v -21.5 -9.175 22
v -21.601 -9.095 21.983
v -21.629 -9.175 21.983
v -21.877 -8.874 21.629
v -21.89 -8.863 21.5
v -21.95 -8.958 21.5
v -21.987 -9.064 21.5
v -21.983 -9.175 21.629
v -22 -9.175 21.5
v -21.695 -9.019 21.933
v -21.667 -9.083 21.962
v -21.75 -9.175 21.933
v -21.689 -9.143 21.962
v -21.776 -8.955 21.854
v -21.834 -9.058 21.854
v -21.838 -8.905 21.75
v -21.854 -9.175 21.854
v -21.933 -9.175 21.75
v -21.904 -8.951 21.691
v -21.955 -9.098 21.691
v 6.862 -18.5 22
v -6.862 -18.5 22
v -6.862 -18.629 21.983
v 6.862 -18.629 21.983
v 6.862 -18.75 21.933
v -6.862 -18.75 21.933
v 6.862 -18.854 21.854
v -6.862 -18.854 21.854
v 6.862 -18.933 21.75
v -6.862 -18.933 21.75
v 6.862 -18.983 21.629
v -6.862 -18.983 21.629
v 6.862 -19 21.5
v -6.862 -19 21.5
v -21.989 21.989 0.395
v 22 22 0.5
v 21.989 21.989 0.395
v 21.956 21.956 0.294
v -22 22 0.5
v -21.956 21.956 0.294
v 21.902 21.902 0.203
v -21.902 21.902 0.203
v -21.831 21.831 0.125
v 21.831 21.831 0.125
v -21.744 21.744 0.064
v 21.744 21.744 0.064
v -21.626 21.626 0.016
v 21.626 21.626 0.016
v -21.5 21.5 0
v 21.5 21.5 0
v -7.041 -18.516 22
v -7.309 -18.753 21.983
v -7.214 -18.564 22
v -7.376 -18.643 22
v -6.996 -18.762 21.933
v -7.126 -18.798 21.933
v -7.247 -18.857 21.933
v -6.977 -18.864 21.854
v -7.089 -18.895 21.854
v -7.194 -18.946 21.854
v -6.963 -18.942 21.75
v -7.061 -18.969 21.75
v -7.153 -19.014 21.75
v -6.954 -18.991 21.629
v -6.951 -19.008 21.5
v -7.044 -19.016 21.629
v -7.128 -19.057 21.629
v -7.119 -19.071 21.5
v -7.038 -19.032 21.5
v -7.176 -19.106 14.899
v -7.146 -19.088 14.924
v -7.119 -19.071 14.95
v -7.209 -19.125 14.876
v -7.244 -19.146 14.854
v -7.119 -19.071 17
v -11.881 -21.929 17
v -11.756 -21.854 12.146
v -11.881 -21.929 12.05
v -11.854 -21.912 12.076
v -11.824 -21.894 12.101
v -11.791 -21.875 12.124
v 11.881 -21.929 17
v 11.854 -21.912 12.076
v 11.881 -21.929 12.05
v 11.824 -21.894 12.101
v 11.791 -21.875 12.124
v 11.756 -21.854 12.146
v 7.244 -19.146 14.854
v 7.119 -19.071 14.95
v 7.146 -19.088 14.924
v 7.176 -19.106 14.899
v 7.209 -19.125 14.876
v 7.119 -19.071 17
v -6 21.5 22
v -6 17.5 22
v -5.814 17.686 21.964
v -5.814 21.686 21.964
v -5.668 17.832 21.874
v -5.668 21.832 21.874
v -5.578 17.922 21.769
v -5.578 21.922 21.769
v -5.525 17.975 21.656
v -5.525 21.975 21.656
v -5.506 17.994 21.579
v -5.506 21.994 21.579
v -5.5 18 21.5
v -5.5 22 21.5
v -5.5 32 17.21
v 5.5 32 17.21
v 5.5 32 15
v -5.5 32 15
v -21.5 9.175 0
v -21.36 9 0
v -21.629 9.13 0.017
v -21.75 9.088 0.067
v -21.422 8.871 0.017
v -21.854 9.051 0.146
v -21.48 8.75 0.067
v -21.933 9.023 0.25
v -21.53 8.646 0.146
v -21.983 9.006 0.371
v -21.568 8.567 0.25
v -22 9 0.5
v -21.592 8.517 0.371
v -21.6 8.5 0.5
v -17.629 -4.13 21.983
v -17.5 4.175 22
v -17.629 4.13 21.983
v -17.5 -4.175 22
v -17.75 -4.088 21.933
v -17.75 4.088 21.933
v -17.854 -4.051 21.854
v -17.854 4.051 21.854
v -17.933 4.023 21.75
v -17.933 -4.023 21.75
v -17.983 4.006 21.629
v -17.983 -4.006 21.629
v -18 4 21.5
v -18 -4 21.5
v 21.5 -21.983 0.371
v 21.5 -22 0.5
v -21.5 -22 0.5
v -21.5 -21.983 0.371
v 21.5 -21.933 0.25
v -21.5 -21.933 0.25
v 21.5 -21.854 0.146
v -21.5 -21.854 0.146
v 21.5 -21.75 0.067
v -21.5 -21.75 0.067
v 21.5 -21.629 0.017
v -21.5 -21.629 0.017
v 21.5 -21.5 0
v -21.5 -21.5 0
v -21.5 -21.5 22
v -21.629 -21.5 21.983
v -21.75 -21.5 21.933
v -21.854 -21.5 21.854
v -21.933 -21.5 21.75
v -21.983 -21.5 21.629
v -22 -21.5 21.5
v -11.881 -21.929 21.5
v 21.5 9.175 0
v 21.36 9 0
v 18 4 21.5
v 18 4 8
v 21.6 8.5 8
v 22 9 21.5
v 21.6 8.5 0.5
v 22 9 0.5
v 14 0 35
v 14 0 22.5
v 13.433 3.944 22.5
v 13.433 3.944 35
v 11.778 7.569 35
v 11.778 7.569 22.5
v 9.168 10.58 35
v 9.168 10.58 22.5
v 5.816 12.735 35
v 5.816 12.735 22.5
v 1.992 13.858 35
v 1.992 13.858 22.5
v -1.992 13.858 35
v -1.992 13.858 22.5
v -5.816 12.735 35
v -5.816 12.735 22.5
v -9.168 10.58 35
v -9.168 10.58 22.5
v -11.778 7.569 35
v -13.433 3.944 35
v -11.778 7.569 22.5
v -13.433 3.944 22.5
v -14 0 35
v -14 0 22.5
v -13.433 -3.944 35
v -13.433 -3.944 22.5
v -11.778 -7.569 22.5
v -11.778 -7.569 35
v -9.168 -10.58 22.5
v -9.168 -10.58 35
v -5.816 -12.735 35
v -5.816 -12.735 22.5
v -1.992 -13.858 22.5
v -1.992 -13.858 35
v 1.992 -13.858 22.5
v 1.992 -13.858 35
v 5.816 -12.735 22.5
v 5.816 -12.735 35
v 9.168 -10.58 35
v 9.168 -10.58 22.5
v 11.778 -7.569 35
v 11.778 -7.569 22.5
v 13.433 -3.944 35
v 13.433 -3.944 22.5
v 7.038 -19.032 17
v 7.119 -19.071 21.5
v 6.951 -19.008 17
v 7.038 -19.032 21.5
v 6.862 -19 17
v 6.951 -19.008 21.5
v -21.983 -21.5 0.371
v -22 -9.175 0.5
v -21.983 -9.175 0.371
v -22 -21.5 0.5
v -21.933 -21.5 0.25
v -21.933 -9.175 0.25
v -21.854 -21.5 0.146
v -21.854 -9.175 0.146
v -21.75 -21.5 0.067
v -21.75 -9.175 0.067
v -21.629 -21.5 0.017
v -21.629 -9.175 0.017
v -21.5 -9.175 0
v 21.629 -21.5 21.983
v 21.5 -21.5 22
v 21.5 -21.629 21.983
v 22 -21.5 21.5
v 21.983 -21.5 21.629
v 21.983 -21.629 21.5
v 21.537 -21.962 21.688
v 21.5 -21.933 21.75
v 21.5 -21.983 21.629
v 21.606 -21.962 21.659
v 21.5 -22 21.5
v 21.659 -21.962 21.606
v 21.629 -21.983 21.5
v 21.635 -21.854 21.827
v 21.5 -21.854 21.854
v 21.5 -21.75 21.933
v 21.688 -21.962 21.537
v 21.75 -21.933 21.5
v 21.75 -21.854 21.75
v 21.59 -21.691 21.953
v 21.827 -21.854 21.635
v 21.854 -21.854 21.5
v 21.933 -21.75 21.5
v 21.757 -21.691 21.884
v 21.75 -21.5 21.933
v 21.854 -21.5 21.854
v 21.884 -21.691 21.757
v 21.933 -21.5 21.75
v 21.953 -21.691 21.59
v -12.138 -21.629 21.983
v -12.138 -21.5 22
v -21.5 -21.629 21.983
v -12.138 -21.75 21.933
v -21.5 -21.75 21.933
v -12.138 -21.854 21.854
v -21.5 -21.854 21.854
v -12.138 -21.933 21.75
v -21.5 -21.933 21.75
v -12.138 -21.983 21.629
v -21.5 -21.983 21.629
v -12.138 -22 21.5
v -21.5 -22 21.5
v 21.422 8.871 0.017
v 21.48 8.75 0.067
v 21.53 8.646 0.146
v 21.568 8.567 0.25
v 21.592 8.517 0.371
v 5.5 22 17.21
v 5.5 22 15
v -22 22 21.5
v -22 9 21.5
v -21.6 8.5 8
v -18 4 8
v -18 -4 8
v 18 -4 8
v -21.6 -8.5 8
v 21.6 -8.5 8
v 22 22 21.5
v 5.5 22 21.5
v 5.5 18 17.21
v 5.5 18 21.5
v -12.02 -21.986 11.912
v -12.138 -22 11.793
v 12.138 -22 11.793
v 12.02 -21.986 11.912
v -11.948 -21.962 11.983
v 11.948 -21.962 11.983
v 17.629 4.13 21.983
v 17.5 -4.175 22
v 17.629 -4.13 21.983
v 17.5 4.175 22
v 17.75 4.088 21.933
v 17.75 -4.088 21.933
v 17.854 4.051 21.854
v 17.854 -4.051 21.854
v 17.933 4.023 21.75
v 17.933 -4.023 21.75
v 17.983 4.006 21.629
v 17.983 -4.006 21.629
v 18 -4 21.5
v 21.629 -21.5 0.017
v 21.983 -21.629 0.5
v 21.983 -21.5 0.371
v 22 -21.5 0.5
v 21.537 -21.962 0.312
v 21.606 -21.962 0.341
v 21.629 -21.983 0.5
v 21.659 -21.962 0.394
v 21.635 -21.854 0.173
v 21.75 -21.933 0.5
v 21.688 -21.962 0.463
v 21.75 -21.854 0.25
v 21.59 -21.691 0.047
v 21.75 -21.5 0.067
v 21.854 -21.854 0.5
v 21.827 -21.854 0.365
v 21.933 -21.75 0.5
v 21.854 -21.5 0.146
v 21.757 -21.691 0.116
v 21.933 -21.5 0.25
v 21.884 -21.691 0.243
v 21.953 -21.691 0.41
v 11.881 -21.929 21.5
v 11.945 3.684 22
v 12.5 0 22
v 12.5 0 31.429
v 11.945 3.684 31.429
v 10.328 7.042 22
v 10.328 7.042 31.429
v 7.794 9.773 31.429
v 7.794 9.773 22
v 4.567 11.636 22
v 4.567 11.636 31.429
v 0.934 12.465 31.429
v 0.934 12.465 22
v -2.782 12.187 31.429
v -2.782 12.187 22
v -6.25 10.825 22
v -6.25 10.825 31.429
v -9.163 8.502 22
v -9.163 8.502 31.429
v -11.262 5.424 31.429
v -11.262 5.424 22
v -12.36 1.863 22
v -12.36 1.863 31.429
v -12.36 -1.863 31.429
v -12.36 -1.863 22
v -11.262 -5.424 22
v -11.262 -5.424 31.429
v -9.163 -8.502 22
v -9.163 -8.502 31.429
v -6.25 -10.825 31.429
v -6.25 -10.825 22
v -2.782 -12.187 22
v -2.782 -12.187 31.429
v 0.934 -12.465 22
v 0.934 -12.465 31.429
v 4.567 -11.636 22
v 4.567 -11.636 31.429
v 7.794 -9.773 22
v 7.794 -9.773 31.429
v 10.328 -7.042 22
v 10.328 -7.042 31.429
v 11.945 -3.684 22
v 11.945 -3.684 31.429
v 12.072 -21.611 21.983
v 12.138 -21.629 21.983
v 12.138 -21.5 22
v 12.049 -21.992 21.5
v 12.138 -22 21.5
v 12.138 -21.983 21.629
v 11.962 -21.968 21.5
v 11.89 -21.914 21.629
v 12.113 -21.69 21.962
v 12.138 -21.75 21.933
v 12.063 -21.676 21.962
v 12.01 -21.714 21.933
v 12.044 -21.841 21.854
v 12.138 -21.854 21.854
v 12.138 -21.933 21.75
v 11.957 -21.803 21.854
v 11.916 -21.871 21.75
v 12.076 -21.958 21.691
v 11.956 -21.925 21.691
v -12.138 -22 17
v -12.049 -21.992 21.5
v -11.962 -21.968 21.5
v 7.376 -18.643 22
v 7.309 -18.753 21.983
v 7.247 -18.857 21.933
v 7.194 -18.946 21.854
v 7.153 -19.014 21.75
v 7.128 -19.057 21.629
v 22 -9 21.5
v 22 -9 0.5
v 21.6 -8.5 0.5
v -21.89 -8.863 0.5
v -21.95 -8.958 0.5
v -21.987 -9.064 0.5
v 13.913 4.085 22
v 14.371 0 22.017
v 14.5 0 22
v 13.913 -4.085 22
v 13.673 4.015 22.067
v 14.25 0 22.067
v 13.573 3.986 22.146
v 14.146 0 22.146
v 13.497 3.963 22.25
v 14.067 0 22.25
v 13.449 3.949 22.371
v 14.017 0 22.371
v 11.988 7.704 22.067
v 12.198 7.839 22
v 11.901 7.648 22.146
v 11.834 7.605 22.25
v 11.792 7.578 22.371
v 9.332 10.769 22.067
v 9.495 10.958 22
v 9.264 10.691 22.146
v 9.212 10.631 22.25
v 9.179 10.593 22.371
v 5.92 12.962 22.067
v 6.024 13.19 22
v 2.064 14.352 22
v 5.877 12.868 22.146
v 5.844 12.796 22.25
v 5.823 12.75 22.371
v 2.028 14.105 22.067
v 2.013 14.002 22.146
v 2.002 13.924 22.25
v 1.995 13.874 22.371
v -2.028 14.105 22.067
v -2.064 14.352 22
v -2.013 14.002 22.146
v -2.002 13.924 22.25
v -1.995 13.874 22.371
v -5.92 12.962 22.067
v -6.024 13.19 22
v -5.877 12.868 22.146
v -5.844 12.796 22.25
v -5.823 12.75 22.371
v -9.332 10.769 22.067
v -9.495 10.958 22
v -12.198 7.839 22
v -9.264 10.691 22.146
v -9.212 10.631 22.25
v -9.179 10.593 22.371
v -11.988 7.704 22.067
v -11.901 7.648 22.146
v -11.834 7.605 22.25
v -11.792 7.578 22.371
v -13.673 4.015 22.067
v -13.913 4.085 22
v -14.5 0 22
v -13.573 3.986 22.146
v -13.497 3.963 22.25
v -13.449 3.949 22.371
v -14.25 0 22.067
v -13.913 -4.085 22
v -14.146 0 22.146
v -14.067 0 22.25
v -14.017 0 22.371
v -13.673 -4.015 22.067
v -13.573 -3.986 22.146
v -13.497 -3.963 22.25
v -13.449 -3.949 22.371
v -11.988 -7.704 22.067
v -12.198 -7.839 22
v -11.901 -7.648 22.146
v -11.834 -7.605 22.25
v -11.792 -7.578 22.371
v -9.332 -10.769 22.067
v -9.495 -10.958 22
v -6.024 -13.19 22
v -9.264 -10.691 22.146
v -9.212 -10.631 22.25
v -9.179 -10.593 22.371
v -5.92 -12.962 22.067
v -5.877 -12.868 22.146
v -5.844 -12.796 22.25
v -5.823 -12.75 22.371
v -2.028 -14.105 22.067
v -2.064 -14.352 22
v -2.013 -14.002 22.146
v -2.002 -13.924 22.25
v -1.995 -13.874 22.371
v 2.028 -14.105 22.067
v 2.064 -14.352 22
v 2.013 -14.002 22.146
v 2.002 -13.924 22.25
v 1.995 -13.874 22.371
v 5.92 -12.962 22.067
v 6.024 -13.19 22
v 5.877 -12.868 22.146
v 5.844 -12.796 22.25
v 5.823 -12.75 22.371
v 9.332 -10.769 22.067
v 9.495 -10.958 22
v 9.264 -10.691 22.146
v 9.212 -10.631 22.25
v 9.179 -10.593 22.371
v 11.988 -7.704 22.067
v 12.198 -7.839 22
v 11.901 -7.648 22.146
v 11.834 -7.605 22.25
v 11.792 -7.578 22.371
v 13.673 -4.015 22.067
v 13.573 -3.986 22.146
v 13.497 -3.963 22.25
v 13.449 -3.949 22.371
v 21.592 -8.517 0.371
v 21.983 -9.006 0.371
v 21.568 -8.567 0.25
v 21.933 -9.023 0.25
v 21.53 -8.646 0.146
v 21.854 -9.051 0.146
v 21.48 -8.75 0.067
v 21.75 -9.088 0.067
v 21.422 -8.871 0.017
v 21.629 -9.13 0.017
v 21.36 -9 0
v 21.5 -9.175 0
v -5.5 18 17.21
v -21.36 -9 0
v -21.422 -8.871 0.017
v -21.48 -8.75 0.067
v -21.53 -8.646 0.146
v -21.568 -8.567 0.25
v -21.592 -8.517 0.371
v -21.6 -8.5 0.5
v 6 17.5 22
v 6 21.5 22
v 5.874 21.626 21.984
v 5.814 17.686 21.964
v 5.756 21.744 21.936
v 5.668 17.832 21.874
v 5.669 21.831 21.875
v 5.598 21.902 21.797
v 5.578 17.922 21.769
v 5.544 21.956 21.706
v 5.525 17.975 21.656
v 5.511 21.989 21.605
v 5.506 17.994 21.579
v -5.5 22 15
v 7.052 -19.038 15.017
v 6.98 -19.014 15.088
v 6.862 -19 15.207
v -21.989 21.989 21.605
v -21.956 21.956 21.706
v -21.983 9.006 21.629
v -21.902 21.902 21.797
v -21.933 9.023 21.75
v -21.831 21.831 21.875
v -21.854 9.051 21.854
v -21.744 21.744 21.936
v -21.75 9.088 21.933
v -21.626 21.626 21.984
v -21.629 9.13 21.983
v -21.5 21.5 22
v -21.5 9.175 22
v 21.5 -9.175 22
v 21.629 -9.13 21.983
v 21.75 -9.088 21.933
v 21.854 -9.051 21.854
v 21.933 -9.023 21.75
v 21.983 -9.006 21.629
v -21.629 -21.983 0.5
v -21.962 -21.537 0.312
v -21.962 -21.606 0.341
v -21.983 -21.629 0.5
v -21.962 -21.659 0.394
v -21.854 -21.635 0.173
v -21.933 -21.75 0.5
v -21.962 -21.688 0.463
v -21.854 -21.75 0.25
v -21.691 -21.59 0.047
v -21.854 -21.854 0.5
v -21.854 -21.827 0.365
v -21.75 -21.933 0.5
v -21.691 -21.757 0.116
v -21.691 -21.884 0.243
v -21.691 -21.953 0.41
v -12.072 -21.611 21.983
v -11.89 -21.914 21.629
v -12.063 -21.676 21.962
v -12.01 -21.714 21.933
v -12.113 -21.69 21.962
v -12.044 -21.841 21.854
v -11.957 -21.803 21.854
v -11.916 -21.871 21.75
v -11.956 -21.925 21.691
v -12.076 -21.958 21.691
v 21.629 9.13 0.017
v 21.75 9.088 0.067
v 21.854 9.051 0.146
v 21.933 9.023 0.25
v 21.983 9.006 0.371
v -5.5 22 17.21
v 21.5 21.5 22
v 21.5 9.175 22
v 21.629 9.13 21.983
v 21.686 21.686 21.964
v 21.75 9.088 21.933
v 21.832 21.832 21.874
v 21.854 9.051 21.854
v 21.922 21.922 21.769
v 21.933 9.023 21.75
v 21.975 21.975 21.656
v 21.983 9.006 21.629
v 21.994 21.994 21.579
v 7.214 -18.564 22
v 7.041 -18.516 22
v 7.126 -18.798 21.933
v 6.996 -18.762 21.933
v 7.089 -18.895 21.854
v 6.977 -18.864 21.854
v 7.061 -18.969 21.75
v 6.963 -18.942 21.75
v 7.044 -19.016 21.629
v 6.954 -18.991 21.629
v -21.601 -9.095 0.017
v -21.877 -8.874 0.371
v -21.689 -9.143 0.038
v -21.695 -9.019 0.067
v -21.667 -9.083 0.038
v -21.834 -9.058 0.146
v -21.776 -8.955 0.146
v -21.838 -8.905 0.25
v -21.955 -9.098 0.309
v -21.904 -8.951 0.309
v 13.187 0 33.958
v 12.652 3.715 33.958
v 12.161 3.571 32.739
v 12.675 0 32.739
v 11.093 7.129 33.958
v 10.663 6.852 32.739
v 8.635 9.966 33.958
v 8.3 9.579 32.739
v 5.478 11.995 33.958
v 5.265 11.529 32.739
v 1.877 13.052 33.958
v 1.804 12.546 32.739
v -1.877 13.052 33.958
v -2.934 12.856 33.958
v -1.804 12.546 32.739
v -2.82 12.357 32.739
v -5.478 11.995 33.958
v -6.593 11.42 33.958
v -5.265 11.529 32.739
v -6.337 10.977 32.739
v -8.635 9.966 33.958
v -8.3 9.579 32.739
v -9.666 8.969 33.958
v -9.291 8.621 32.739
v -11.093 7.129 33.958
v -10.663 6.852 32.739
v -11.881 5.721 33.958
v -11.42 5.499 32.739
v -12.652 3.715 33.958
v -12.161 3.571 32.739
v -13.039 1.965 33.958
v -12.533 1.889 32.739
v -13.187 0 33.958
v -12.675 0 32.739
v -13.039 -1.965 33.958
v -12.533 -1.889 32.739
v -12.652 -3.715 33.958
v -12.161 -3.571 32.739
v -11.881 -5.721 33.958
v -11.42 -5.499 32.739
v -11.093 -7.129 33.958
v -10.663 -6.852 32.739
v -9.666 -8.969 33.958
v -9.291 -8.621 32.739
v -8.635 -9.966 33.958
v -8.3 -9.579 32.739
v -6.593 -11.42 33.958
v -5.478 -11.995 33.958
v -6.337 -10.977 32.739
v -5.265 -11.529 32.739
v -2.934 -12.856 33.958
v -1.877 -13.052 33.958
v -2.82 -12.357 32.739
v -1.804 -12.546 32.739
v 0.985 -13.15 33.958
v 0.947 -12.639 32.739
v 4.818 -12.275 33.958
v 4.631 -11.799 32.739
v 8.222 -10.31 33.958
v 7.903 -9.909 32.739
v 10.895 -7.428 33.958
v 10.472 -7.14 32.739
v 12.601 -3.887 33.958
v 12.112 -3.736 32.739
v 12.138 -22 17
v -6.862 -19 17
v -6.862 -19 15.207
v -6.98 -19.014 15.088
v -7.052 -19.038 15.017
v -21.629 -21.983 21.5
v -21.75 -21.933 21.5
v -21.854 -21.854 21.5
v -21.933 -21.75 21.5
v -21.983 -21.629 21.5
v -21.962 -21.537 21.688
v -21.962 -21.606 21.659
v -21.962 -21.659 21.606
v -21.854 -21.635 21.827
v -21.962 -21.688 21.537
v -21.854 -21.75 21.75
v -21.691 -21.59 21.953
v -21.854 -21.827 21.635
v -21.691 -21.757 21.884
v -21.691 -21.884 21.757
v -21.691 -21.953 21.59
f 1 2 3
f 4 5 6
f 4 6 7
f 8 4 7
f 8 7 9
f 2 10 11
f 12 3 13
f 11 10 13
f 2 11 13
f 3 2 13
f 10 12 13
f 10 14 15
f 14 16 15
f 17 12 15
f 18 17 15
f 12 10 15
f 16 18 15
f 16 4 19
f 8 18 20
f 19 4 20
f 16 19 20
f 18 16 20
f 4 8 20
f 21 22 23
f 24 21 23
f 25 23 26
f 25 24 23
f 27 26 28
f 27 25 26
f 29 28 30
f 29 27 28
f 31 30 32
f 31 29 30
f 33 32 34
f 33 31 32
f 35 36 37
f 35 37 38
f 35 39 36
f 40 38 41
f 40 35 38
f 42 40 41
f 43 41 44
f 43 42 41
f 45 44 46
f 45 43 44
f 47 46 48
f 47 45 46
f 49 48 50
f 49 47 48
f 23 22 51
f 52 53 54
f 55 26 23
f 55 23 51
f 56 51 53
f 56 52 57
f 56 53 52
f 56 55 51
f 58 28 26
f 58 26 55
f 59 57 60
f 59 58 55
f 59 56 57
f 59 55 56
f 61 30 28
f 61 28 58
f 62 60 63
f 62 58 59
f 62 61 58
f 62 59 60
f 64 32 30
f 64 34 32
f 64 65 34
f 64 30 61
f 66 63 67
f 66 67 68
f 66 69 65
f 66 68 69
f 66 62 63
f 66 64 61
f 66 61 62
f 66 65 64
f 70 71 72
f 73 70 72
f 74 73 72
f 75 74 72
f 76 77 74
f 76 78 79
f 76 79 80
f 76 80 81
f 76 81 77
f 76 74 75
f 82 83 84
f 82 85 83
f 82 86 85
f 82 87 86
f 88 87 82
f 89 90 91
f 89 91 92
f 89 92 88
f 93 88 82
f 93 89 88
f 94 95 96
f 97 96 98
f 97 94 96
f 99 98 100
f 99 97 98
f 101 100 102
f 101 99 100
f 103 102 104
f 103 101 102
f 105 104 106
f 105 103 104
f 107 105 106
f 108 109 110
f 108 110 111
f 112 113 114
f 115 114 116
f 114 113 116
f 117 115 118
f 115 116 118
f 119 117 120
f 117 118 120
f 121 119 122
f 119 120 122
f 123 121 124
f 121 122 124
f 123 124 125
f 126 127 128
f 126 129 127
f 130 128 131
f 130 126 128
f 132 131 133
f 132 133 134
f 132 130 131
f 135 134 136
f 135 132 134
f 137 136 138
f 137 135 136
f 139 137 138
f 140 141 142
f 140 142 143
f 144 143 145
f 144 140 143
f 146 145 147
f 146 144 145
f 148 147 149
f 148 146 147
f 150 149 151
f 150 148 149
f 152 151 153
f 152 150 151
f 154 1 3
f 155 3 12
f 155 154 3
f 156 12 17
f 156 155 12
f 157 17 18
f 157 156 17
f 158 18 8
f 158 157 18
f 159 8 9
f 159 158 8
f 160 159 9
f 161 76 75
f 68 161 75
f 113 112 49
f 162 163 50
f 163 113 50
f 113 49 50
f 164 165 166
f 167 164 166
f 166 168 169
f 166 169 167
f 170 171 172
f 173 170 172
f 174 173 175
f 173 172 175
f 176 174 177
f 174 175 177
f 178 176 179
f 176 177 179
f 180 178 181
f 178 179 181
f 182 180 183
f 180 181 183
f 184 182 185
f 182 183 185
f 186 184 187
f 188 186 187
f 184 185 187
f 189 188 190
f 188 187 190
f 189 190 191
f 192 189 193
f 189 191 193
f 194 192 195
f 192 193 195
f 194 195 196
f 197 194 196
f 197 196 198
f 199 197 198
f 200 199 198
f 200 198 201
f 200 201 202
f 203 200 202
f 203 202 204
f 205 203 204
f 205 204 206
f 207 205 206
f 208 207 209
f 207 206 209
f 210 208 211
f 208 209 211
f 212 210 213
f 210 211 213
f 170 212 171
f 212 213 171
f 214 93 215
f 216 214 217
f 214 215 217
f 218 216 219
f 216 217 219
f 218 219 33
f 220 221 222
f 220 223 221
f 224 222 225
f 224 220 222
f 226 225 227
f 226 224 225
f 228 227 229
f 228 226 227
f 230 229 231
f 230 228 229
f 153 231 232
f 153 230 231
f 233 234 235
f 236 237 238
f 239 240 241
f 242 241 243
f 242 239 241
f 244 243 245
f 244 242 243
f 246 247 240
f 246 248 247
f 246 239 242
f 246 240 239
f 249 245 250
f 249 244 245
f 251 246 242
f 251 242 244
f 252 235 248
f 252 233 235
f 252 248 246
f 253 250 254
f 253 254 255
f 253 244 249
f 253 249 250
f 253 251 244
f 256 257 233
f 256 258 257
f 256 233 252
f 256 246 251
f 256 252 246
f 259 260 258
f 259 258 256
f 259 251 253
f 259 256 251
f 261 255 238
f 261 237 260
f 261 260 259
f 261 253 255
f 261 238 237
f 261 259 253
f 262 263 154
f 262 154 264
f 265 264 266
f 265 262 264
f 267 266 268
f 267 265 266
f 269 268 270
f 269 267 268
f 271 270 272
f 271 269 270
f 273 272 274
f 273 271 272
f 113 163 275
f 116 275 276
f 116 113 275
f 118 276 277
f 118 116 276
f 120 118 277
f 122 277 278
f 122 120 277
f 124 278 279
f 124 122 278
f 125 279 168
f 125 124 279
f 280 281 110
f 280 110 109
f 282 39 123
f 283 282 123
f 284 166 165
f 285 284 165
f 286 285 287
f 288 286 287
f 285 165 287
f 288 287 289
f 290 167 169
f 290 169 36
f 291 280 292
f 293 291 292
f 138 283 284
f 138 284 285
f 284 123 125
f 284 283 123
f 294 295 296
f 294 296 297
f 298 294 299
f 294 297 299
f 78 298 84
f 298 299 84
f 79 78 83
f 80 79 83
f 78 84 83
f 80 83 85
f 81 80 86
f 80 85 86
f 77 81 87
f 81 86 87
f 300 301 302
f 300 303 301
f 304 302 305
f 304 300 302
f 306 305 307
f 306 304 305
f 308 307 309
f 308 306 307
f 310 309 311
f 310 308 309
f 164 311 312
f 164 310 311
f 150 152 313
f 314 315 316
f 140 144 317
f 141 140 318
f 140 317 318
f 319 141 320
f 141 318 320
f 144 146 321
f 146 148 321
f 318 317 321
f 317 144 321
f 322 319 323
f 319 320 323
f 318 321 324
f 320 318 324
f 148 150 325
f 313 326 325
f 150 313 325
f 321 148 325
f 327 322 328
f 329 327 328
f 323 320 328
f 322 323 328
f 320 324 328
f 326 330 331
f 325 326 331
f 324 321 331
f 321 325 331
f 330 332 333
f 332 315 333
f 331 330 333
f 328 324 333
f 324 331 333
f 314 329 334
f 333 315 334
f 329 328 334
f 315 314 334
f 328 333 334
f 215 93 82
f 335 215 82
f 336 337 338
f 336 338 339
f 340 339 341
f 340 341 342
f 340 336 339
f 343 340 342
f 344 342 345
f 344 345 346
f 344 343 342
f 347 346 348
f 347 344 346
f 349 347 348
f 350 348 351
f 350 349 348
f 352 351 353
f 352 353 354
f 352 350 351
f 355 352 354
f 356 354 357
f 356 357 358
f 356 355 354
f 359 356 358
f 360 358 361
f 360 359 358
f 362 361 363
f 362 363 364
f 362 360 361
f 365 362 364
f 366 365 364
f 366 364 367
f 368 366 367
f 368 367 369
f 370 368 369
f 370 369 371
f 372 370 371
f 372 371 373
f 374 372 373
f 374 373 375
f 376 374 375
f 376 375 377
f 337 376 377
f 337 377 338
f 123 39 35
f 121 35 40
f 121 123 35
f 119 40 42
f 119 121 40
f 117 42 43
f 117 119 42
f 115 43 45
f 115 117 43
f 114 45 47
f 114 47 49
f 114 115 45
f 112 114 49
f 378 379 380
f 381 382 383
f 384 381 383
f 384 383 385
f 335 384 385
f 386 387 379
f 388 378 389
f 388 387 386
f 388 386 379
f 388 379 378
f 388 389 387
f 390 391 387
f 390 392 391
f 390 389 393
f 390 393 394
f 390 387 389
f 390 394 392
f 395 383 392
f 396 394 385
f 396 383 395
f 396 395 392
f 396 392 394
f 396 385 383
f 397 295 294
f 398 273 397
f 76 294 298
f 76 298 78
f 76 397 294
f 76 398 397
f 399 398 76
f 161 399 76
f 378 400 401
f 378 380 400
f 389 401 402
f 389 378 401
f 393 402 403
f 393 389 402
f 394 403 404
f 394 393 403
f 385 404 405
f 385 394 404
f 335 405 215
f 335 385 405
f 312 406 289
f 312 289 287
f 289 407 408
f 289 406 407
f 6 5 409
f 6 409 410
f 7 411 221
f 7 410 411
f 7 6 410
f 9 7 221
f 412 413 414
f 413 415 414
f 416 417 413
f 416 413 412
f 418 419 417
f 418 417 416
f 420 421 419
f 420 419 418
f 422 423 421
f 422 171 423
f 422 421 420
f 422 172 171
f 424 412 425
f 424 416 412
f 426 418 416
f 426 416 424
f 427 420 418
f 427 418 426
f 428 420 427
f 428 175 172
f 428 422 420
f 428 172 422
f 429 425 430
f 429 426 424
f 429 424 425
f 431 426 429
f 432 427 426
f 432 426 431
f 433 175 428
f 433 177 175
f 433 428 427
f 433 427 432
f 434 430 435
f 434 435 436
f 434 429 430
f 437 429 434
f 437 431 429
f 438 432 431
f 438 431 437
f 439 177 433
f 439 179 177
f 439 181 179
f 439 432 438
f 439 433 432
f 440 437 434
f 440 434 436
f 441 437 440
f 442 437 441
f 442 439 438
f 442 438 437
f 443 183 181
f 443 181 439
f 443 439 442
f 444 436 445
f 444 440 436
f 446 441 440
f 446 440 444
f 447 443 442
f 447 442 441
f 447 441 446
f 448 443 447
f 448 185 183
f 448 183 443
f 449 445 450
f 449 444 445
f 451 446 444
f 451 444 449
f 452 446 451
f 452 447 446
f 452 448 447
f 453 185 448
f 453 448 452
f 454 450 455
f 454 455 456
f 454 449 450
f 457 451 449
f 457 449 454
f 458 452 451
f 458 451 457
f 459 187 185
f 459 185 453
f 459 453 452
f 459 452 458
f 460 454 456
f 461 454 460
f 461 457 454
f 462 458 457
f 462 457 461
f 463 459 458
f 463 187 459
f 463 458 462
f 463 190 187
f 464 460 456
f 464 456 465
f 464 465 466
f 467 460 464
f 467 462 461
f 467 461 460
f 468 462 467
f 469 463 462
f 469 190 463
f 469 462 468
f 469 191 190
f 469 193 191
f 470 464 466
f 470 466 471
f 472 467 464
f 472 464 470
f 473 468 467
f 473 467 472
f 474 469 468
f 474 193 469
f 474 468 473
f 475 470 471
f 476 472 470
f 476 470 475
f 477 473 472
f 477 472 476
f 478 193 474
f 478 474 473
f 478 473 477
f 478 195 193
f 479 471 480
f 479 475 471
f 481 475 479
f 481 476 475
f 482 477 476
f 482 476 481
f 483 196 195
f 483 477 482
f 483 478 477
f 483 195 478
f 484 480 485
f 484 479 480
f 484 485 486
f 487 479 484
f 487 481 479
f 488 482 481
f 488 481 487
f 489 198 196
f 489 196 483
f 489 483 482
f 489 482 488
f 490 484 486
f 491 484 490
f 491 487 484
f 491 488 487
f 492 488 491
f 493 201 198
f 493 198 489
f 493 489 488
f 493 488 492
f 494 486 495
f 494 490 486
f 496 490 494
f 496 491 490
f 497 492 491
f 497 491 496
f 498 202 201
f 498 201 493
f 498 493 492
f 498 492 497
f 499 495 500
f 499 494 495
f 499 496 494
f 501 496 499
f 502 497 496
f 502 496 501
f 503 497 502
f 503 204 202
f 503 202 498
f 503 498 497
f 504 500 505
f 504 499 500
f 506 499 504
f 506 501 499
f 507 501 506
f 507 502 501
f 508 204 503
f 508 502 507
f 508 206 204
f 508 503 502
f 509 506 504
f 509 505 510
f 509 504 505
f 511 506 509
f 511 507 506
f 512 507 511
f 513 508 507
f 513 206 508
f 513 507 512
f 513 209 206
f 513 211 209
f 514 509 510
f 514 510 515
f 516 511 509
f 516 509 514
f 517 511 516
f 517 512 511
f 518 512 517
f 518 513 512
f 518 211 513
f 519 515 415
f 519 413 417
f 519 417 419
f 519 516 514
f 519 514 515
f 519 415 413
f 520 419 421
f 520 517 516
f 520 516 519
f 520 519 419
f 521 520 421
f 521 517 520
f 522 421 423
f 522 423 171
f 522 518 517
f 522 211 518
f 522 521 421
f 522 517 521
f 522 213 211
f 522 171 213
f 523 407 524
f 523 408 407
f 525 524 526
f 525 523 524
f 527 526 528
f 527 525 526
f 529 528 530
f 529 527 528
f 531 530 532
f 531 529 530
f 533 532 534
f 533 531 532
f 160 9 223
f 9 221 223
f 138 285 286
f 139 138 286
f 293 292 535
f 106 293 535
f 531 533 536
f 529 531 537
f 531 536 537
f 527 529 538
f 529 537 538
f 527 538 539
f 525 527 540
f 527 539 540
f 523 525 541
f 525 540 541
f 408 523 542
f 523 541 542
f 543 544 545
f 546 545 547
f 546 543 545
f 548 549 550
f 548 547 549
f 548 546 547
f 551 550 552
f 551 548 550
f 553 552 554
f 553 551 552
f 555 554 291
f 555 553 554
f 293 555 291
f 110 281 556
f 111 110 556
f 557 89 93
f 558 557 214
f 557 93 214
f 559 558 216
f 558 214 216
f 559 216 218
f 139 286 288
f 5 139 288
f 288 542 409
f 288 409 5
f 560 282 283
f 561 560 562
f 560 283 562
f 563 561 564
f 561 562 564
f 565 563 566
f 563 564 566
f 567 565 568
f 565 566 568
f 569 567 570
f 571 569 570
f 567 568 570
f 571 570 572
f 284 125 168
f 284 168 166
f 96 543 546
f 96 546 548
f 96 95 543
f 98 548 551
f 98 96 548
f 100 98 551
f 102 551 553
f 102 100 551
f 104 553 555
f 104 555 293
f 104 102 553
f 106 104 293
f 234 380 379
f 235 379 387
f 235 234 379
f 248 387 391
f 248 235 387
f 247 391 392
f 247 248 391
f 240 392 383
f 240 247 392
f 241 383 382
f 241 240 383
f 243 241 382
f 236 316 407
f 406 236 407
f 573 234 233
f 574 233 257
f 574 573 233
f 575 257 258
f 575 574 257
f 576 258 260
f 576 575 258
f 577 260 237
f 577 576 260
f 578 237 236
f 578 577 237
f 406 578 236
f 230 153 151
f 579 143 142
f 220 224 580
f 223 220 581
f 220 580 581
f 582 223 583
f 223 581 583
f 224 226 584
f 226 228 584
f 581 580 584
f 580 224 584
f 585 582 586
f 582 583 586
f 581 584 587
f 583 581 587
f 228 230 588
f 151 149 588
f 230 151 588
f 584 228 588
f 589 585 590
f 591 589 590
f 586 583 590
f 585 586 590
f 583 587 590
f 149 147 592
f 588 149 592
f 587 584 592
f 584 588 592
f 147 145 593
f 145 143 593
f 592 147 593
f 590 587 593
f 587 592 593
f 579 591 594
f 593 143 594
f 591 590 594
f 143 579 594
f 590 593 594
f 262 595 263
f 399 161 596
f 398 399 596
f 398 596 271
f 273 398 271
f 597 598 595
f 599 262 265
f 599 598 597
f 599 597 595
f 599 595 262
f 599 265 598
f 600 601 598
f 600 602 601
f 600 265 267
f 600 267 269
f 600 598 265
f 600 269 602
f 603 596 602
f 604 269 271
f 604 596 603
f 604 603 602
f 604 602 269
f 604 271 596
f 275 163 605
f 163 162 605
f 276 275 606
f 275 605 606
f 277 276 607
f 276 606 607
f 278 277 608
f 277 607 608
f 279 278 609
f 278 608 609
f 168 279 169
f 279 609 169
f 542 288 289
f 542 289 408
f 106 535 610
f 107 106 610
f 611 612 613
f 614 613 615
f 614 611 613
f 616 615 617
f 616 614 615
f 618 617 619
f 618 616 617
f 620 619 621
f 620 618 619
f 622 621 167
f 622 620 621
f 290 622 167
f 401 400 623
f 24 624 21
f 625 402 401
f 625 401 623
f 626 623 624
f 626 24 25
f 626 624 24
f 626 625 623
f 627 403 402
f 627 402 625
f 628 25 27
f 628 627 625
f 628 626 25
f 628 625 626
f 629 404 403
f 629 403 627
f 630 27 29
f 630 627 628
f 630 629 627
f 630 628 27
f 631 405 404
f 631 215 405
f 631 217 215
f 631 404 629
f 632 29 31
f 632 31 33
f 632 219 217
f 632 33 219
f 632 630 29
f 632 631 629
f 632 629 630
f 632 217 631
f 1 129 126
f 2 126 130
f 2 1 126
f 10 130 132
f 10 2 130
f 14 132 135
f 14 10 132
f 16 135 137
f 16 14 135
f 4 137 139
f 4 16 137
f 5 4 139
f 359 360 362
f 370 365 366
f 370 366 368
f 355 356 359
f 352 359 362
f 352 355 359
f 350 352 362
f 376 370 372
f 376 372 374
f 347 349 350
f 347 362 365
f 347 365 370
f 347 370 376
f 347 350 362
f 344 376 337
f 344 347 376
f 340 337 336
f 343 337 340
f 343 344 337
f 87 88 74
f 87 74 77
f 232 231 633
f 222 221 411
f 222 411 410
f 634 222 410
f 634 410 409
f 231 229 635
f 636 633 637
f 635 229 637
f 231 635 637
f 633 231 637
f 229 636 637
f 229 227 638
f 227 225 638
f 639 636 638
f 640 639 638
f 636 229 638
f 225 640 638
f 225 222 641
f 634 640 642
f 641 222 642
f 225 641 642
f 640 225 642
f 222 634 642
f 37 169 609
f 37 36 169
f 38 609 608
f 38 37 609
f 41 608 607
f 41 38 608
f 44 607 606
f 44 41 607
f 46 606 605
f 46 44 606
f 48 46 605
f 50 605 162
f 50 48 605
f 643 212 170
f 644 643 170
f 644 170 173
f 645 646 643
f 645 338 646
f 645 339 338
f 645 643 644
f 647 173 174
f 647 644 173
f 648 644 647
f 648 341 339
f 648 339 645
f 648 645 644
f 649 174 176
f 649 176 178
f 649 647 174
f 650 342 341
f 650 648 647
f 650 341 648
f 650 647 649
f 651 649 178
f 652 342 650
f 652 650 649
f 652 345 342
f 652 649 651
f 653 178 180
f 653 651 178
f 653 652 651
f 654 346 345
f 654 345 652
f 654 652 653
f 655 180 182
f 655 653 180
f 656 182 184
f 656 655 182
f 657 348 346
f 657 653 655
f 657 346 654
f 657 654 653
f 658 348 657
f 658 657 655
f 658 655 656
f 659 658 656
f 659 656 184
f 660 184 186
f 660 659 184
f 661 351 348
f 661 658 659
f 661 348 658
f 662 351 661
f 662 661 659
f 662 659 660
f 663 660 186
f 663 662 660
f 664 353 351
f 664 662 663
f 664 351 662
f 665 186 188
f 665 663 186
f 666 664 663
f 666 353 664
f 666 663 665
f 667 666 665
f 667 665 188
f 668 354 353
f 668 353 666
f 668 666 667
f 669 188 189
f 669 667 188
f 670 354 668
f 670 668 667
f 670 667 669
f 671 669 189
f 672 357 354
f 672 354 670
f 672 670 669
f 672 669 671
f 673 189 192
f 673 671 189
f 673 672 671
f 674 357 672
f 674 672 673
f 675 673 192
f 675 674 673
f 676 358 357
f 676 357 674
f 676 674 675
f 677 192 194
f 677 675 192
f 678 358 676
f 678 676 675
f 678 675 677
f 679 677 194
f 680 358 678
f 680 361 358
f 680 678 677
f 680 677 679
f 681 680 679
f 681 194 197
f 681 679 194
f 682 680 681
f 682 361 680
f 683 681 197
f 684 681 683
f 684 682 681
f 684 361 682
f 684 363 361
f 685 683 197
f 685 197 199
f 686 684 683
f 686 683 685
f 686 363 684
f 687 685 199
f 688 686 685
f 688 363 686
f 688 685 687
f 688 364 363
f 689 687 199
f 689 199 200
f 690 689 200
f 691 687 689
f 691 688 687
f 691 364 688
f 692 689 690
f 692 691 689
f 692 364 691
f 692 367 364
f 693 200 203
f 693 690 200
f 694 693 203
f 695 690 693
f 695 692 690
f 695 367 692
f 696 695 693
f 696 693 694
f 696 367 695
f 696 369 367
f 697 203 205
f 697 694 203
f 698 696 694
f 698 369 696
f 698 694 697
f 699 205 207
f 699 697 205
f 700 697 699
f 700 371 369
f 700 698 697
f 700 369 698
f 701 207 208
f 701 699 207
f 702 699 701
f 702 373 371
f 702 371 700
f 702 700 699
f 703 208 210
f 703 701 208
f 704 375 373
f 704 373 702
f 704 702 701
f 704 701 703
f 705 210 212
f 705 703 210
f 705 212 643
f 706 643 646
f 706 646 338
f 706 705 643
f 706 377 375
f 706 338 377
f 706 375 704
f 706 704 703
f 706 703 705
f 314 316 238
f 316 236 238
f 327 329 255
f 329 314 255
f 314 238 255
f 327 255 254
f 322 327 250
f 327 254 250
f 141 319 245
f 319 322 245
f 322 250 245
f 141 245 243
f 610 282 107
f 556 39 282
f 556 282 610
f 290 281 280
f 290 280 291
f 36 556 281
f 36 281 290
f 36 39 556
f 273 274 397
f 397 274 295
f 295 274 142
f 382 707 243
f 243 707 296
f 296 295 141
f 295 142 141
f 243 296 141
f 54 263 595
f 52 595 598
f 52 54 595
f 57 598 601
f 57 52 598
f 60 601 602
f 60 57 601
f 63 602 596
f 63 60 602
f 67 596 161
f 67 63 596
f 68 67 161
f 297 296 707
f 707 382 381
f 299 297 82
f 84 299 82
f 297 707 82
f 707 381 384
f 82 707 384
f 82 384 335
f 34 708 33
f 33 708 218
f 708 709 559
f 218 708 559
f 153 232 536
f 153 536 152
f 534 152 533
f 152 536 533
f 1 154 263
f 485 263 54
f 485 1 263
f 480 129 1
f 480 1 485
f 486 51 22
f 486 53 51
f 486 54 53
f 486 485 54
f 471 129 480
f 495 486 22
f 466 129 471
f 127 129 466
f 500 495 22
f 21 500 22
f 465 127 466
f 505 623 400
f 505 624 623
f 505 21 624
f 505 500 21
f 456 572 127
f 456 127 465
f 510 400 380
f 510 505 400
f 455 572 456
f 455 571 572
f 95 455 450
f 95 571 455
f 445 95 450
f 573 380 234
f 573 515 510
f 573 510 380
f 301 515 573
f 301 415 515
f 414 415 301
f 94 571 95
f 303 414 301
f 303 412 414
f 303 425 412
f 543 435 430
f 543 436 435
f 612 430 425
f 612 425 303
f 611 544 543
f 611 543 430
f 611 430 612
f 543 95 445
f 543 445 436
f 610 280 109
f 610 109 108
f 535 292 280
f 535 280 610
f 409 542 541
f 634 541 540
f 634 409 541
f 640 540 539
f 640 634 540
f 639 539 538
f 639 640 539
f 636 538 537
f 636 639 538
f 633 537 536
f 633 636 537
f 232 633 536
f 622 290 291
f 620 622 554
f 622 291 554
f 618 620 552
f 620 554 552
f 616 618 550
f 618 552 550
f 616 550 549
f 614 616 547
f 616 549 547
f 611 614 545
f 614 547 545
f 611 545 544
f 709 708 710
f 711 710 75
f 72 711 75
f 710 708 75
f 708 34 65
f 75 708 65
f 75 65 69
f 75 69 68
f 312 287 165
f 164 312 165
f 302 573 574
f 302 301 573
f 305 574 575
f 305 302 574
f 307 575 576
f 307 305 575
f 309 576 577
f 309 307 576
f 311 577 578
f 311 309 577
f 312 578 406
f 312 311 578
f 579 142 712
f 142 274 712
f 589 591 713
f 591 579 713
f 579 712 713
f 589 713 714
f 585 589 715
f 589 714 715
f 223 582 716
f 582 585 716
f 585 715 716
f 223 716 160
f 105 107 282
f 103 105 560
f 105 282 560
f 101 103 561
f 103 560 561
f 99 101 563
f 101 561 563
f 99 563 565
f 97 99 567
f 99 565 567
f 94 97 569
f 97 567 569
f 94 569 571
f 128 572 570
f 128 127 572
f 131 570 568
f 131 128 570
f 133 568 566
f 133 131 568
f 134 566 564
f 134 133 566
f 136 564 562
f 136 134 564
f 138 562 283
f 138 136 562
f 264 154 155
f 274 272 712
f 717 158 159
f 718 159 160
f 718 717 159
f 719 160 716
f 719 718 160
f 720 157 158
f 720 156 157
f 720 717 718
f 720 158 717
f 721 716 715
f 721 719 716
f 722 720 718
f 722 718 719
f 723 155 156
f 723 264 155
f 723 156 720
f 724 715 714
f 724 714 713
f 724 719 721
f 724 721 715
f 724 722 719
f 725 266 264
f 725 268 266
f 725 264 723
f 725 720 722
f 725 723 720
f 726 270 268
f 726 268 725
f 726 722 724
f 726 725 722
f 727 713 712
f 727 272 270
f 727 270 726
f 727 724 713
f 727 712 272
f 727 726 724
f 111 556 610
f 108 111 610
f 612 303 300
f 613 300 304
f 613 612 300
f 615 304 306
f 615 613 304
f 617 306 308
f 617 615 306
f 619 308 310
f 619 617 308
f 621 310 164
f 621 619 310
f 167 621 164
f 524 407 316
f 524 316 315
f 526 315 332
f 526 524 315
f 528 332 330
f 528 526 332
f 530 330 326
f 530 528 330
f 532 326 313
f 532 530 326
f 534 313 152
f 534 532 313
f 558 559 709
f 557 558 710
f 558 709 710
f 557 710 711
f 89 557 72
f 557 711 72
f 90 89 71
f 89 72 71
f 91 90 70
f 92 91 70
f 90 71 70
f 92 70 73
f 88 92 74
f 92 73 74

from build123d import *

# Parameters (mm, degrees)
F1_DEPTH    = 22
F2_DEPTH    = 17
F3_T4_DEPTH = 49.7168298797
F5_DEPTH    = 44
F0_W        = 11
F0_H        = 4
F6_DEPTH    = 15
F7_W        = 11
F7_H        = 2.2102209181
F8_DEPTH    = 14
F9_R        = 14
F9_R_2      = 12.5
F10_DEPTH   = 13
F12_R       = 0.5


# Not quite as in the source:
# - a fillet or chamfer that OpenCascade refuses, or shapes differently, is made with other operations: its cross-section is extruded or revolved along the edge and cut away or added


with BuildPart() as f1:
    # F0 (on Top) → F1 (new body)
    with BuildSketch(Plane.XY):
        Polygon((22, 9), (22, 22), (5.5, 22), (5.5, 18), (-5.5, 18), (-5.5, 22), (-22, 22), (-22, 9), (-18, 4), (-18, -4), (-22, -9), (-22, -22), (-12, -22), (-7, -19), (7, -19), (12, -22), (22, -22), (22, -9), (18, -4), (18, 4), align=None)
    extrude(amount=F1_DEPTH)

    # F0 (on Top) → F2 (join)
    with BuildSketch(Plane.XY):
        Polygon((-12, -22), (12, -22), (7, -19), (-7, -19), align=None)
    extrude(amount=F2_DEPTH)

    # F3: chamfer of 5 on 1 edges, made by hand


with BuildPart() as f3_tool2:
    # F3_s3 → F3_t4 (new body)
    with BuildSketch(Plane.YZ.offset(-24.8584149398)):
        Polygon((-17, 17), (-22, 12), (-22, 17), align=None)
    extrude(amount=F3_T4_DEPTH)

    split(bisect_by=Plane(origin=(-6.5294117647, -10.8823529412, 0), x_dir=(0, 0, 1), z_dir=(-0.5144957554, -0.8574929257, 0)), keep=Keep.TOP)

    split(bisect_by=Plane.XZ.offset(19), keep=Keep.TOP)

    split(bisect_by=Plane(origin=(6.5294117647, -10.8823529412, 0), x_dir=(0, 0, 1), z_dir=(0.5144957554, -0.8574929257, 0)), keep=Keep.TOP)


with BuildPart() as f1_1:
    add(f1.part)

    # F3_t1: cut F3_tool2
    add(f3_tool2.part, mode=Mode.SUBTRACT)

    # F4 (on face) → F5 (cut, through all)
    with BuildSketch(Plane.YZ.offset(22)):
        Polygon((8.5, 8), (-8.5, 8), (-8.5, 0), (0, 0), (8.5, 0), align=None)
    extrude(amount=-F5_DEPTH, mode=Mode.SUBTRACT)

    # F0 (on Top) → F6 (join)
    with BuildSketch(Plane.XY):
        with Locations((0, 20)):
            Rectangle(F0_W, F0_H)
    extrude(amount=F6_DEPTH)

    # F7 (on face) → F8 (join)
    with BuildSketch(Plane(origin=(0, 18, 0), x_dir=(-1, 0, 0), z_dir=(0, 1, 0))):
        with Locations((0, 16.105110459)):
            Rectangle(F7_W, F7_H)
    extrude(amount=F8_DEPTH)

    # F9 (on face) → F10 (join)
    with BuildSketch(Plane.XY.offset(22)):
        Circle(F9_R)
        Circle(F9_R_2, mode=Mode.SUBTRACT)
    extrude(amount=F10_DEPTH)

    # F11: fillet of radius 5 on 1 edges, made by hand

    # F11_s1 → F11_t2 (revolve, cut)
    with BuildSketch(Plane.XZ):
        with BuildLine():
            ThreePointArc((14, 35), (12.8902277714, 33.3657774588), (12.5, 31.4292857857))
            Line((12.5, 31.4292857857), (12.5, 35))
            Line((12.5, 35), (14, 35))
        make_face()
    revolve(axis=Axis((0, 0, 35), (0, 0, 1)), mode=Mode.SUBTRACT)

    # F12
    f12_edges = [f1_1.edges().sort_by_distance(p)[0] for p in [
        (22, 15.5, 22),
        (20, 6.5, 22),
        (13.75, 22, 22),
        (18, 0, 22),
        (5.5, 20, 22),
        (20, -6.5, 22),
        (0, 18, 22),
        (22, -15.5, 22),
        (-5.5, 20, 22),
        (17, -22, 22),
        (-13.75, 22, 22),
        (9.5, -20.5, 22),
        (-22, 15.5, 22),
        (0, -19, 22),
        (-20, 6.5, 22),
        (-9.5, -20.5, 22),
        (-18, 0, 22),
        (-17, -22, 22),
        (-20, -6.5, 22),
        (-22, -15.5, 22),
        (-14, 0, 22),
        (21.8, 8.75, 0),
        (22, 15.5, 0),
        (0, 22, 0),
        (-22, 15.5, 0),
        (-21.8, 8.75, 0),
        (0, 8.5, 0),
        (21.8, -8.75, 0),
        (22, -15.5, 0),
        (0, -22, 0),
        (-22, -15.5, 0),
        (-21.8, -8.75, 0),
        (0, -8.5, 0),
        (7, -19, 18.5),
        (0, -19, 15),
        (-7, -19, 18.5),
        (-22, -22, 11),
        (-12, -22, 17),
        (0, -22, 12),
        (12, -22, 17),
        (22, -22, 11),
        (-22, -9, 11),
    ]]
    fillet(f12_edges, radius=F12_R)


solid = f1_1.part
